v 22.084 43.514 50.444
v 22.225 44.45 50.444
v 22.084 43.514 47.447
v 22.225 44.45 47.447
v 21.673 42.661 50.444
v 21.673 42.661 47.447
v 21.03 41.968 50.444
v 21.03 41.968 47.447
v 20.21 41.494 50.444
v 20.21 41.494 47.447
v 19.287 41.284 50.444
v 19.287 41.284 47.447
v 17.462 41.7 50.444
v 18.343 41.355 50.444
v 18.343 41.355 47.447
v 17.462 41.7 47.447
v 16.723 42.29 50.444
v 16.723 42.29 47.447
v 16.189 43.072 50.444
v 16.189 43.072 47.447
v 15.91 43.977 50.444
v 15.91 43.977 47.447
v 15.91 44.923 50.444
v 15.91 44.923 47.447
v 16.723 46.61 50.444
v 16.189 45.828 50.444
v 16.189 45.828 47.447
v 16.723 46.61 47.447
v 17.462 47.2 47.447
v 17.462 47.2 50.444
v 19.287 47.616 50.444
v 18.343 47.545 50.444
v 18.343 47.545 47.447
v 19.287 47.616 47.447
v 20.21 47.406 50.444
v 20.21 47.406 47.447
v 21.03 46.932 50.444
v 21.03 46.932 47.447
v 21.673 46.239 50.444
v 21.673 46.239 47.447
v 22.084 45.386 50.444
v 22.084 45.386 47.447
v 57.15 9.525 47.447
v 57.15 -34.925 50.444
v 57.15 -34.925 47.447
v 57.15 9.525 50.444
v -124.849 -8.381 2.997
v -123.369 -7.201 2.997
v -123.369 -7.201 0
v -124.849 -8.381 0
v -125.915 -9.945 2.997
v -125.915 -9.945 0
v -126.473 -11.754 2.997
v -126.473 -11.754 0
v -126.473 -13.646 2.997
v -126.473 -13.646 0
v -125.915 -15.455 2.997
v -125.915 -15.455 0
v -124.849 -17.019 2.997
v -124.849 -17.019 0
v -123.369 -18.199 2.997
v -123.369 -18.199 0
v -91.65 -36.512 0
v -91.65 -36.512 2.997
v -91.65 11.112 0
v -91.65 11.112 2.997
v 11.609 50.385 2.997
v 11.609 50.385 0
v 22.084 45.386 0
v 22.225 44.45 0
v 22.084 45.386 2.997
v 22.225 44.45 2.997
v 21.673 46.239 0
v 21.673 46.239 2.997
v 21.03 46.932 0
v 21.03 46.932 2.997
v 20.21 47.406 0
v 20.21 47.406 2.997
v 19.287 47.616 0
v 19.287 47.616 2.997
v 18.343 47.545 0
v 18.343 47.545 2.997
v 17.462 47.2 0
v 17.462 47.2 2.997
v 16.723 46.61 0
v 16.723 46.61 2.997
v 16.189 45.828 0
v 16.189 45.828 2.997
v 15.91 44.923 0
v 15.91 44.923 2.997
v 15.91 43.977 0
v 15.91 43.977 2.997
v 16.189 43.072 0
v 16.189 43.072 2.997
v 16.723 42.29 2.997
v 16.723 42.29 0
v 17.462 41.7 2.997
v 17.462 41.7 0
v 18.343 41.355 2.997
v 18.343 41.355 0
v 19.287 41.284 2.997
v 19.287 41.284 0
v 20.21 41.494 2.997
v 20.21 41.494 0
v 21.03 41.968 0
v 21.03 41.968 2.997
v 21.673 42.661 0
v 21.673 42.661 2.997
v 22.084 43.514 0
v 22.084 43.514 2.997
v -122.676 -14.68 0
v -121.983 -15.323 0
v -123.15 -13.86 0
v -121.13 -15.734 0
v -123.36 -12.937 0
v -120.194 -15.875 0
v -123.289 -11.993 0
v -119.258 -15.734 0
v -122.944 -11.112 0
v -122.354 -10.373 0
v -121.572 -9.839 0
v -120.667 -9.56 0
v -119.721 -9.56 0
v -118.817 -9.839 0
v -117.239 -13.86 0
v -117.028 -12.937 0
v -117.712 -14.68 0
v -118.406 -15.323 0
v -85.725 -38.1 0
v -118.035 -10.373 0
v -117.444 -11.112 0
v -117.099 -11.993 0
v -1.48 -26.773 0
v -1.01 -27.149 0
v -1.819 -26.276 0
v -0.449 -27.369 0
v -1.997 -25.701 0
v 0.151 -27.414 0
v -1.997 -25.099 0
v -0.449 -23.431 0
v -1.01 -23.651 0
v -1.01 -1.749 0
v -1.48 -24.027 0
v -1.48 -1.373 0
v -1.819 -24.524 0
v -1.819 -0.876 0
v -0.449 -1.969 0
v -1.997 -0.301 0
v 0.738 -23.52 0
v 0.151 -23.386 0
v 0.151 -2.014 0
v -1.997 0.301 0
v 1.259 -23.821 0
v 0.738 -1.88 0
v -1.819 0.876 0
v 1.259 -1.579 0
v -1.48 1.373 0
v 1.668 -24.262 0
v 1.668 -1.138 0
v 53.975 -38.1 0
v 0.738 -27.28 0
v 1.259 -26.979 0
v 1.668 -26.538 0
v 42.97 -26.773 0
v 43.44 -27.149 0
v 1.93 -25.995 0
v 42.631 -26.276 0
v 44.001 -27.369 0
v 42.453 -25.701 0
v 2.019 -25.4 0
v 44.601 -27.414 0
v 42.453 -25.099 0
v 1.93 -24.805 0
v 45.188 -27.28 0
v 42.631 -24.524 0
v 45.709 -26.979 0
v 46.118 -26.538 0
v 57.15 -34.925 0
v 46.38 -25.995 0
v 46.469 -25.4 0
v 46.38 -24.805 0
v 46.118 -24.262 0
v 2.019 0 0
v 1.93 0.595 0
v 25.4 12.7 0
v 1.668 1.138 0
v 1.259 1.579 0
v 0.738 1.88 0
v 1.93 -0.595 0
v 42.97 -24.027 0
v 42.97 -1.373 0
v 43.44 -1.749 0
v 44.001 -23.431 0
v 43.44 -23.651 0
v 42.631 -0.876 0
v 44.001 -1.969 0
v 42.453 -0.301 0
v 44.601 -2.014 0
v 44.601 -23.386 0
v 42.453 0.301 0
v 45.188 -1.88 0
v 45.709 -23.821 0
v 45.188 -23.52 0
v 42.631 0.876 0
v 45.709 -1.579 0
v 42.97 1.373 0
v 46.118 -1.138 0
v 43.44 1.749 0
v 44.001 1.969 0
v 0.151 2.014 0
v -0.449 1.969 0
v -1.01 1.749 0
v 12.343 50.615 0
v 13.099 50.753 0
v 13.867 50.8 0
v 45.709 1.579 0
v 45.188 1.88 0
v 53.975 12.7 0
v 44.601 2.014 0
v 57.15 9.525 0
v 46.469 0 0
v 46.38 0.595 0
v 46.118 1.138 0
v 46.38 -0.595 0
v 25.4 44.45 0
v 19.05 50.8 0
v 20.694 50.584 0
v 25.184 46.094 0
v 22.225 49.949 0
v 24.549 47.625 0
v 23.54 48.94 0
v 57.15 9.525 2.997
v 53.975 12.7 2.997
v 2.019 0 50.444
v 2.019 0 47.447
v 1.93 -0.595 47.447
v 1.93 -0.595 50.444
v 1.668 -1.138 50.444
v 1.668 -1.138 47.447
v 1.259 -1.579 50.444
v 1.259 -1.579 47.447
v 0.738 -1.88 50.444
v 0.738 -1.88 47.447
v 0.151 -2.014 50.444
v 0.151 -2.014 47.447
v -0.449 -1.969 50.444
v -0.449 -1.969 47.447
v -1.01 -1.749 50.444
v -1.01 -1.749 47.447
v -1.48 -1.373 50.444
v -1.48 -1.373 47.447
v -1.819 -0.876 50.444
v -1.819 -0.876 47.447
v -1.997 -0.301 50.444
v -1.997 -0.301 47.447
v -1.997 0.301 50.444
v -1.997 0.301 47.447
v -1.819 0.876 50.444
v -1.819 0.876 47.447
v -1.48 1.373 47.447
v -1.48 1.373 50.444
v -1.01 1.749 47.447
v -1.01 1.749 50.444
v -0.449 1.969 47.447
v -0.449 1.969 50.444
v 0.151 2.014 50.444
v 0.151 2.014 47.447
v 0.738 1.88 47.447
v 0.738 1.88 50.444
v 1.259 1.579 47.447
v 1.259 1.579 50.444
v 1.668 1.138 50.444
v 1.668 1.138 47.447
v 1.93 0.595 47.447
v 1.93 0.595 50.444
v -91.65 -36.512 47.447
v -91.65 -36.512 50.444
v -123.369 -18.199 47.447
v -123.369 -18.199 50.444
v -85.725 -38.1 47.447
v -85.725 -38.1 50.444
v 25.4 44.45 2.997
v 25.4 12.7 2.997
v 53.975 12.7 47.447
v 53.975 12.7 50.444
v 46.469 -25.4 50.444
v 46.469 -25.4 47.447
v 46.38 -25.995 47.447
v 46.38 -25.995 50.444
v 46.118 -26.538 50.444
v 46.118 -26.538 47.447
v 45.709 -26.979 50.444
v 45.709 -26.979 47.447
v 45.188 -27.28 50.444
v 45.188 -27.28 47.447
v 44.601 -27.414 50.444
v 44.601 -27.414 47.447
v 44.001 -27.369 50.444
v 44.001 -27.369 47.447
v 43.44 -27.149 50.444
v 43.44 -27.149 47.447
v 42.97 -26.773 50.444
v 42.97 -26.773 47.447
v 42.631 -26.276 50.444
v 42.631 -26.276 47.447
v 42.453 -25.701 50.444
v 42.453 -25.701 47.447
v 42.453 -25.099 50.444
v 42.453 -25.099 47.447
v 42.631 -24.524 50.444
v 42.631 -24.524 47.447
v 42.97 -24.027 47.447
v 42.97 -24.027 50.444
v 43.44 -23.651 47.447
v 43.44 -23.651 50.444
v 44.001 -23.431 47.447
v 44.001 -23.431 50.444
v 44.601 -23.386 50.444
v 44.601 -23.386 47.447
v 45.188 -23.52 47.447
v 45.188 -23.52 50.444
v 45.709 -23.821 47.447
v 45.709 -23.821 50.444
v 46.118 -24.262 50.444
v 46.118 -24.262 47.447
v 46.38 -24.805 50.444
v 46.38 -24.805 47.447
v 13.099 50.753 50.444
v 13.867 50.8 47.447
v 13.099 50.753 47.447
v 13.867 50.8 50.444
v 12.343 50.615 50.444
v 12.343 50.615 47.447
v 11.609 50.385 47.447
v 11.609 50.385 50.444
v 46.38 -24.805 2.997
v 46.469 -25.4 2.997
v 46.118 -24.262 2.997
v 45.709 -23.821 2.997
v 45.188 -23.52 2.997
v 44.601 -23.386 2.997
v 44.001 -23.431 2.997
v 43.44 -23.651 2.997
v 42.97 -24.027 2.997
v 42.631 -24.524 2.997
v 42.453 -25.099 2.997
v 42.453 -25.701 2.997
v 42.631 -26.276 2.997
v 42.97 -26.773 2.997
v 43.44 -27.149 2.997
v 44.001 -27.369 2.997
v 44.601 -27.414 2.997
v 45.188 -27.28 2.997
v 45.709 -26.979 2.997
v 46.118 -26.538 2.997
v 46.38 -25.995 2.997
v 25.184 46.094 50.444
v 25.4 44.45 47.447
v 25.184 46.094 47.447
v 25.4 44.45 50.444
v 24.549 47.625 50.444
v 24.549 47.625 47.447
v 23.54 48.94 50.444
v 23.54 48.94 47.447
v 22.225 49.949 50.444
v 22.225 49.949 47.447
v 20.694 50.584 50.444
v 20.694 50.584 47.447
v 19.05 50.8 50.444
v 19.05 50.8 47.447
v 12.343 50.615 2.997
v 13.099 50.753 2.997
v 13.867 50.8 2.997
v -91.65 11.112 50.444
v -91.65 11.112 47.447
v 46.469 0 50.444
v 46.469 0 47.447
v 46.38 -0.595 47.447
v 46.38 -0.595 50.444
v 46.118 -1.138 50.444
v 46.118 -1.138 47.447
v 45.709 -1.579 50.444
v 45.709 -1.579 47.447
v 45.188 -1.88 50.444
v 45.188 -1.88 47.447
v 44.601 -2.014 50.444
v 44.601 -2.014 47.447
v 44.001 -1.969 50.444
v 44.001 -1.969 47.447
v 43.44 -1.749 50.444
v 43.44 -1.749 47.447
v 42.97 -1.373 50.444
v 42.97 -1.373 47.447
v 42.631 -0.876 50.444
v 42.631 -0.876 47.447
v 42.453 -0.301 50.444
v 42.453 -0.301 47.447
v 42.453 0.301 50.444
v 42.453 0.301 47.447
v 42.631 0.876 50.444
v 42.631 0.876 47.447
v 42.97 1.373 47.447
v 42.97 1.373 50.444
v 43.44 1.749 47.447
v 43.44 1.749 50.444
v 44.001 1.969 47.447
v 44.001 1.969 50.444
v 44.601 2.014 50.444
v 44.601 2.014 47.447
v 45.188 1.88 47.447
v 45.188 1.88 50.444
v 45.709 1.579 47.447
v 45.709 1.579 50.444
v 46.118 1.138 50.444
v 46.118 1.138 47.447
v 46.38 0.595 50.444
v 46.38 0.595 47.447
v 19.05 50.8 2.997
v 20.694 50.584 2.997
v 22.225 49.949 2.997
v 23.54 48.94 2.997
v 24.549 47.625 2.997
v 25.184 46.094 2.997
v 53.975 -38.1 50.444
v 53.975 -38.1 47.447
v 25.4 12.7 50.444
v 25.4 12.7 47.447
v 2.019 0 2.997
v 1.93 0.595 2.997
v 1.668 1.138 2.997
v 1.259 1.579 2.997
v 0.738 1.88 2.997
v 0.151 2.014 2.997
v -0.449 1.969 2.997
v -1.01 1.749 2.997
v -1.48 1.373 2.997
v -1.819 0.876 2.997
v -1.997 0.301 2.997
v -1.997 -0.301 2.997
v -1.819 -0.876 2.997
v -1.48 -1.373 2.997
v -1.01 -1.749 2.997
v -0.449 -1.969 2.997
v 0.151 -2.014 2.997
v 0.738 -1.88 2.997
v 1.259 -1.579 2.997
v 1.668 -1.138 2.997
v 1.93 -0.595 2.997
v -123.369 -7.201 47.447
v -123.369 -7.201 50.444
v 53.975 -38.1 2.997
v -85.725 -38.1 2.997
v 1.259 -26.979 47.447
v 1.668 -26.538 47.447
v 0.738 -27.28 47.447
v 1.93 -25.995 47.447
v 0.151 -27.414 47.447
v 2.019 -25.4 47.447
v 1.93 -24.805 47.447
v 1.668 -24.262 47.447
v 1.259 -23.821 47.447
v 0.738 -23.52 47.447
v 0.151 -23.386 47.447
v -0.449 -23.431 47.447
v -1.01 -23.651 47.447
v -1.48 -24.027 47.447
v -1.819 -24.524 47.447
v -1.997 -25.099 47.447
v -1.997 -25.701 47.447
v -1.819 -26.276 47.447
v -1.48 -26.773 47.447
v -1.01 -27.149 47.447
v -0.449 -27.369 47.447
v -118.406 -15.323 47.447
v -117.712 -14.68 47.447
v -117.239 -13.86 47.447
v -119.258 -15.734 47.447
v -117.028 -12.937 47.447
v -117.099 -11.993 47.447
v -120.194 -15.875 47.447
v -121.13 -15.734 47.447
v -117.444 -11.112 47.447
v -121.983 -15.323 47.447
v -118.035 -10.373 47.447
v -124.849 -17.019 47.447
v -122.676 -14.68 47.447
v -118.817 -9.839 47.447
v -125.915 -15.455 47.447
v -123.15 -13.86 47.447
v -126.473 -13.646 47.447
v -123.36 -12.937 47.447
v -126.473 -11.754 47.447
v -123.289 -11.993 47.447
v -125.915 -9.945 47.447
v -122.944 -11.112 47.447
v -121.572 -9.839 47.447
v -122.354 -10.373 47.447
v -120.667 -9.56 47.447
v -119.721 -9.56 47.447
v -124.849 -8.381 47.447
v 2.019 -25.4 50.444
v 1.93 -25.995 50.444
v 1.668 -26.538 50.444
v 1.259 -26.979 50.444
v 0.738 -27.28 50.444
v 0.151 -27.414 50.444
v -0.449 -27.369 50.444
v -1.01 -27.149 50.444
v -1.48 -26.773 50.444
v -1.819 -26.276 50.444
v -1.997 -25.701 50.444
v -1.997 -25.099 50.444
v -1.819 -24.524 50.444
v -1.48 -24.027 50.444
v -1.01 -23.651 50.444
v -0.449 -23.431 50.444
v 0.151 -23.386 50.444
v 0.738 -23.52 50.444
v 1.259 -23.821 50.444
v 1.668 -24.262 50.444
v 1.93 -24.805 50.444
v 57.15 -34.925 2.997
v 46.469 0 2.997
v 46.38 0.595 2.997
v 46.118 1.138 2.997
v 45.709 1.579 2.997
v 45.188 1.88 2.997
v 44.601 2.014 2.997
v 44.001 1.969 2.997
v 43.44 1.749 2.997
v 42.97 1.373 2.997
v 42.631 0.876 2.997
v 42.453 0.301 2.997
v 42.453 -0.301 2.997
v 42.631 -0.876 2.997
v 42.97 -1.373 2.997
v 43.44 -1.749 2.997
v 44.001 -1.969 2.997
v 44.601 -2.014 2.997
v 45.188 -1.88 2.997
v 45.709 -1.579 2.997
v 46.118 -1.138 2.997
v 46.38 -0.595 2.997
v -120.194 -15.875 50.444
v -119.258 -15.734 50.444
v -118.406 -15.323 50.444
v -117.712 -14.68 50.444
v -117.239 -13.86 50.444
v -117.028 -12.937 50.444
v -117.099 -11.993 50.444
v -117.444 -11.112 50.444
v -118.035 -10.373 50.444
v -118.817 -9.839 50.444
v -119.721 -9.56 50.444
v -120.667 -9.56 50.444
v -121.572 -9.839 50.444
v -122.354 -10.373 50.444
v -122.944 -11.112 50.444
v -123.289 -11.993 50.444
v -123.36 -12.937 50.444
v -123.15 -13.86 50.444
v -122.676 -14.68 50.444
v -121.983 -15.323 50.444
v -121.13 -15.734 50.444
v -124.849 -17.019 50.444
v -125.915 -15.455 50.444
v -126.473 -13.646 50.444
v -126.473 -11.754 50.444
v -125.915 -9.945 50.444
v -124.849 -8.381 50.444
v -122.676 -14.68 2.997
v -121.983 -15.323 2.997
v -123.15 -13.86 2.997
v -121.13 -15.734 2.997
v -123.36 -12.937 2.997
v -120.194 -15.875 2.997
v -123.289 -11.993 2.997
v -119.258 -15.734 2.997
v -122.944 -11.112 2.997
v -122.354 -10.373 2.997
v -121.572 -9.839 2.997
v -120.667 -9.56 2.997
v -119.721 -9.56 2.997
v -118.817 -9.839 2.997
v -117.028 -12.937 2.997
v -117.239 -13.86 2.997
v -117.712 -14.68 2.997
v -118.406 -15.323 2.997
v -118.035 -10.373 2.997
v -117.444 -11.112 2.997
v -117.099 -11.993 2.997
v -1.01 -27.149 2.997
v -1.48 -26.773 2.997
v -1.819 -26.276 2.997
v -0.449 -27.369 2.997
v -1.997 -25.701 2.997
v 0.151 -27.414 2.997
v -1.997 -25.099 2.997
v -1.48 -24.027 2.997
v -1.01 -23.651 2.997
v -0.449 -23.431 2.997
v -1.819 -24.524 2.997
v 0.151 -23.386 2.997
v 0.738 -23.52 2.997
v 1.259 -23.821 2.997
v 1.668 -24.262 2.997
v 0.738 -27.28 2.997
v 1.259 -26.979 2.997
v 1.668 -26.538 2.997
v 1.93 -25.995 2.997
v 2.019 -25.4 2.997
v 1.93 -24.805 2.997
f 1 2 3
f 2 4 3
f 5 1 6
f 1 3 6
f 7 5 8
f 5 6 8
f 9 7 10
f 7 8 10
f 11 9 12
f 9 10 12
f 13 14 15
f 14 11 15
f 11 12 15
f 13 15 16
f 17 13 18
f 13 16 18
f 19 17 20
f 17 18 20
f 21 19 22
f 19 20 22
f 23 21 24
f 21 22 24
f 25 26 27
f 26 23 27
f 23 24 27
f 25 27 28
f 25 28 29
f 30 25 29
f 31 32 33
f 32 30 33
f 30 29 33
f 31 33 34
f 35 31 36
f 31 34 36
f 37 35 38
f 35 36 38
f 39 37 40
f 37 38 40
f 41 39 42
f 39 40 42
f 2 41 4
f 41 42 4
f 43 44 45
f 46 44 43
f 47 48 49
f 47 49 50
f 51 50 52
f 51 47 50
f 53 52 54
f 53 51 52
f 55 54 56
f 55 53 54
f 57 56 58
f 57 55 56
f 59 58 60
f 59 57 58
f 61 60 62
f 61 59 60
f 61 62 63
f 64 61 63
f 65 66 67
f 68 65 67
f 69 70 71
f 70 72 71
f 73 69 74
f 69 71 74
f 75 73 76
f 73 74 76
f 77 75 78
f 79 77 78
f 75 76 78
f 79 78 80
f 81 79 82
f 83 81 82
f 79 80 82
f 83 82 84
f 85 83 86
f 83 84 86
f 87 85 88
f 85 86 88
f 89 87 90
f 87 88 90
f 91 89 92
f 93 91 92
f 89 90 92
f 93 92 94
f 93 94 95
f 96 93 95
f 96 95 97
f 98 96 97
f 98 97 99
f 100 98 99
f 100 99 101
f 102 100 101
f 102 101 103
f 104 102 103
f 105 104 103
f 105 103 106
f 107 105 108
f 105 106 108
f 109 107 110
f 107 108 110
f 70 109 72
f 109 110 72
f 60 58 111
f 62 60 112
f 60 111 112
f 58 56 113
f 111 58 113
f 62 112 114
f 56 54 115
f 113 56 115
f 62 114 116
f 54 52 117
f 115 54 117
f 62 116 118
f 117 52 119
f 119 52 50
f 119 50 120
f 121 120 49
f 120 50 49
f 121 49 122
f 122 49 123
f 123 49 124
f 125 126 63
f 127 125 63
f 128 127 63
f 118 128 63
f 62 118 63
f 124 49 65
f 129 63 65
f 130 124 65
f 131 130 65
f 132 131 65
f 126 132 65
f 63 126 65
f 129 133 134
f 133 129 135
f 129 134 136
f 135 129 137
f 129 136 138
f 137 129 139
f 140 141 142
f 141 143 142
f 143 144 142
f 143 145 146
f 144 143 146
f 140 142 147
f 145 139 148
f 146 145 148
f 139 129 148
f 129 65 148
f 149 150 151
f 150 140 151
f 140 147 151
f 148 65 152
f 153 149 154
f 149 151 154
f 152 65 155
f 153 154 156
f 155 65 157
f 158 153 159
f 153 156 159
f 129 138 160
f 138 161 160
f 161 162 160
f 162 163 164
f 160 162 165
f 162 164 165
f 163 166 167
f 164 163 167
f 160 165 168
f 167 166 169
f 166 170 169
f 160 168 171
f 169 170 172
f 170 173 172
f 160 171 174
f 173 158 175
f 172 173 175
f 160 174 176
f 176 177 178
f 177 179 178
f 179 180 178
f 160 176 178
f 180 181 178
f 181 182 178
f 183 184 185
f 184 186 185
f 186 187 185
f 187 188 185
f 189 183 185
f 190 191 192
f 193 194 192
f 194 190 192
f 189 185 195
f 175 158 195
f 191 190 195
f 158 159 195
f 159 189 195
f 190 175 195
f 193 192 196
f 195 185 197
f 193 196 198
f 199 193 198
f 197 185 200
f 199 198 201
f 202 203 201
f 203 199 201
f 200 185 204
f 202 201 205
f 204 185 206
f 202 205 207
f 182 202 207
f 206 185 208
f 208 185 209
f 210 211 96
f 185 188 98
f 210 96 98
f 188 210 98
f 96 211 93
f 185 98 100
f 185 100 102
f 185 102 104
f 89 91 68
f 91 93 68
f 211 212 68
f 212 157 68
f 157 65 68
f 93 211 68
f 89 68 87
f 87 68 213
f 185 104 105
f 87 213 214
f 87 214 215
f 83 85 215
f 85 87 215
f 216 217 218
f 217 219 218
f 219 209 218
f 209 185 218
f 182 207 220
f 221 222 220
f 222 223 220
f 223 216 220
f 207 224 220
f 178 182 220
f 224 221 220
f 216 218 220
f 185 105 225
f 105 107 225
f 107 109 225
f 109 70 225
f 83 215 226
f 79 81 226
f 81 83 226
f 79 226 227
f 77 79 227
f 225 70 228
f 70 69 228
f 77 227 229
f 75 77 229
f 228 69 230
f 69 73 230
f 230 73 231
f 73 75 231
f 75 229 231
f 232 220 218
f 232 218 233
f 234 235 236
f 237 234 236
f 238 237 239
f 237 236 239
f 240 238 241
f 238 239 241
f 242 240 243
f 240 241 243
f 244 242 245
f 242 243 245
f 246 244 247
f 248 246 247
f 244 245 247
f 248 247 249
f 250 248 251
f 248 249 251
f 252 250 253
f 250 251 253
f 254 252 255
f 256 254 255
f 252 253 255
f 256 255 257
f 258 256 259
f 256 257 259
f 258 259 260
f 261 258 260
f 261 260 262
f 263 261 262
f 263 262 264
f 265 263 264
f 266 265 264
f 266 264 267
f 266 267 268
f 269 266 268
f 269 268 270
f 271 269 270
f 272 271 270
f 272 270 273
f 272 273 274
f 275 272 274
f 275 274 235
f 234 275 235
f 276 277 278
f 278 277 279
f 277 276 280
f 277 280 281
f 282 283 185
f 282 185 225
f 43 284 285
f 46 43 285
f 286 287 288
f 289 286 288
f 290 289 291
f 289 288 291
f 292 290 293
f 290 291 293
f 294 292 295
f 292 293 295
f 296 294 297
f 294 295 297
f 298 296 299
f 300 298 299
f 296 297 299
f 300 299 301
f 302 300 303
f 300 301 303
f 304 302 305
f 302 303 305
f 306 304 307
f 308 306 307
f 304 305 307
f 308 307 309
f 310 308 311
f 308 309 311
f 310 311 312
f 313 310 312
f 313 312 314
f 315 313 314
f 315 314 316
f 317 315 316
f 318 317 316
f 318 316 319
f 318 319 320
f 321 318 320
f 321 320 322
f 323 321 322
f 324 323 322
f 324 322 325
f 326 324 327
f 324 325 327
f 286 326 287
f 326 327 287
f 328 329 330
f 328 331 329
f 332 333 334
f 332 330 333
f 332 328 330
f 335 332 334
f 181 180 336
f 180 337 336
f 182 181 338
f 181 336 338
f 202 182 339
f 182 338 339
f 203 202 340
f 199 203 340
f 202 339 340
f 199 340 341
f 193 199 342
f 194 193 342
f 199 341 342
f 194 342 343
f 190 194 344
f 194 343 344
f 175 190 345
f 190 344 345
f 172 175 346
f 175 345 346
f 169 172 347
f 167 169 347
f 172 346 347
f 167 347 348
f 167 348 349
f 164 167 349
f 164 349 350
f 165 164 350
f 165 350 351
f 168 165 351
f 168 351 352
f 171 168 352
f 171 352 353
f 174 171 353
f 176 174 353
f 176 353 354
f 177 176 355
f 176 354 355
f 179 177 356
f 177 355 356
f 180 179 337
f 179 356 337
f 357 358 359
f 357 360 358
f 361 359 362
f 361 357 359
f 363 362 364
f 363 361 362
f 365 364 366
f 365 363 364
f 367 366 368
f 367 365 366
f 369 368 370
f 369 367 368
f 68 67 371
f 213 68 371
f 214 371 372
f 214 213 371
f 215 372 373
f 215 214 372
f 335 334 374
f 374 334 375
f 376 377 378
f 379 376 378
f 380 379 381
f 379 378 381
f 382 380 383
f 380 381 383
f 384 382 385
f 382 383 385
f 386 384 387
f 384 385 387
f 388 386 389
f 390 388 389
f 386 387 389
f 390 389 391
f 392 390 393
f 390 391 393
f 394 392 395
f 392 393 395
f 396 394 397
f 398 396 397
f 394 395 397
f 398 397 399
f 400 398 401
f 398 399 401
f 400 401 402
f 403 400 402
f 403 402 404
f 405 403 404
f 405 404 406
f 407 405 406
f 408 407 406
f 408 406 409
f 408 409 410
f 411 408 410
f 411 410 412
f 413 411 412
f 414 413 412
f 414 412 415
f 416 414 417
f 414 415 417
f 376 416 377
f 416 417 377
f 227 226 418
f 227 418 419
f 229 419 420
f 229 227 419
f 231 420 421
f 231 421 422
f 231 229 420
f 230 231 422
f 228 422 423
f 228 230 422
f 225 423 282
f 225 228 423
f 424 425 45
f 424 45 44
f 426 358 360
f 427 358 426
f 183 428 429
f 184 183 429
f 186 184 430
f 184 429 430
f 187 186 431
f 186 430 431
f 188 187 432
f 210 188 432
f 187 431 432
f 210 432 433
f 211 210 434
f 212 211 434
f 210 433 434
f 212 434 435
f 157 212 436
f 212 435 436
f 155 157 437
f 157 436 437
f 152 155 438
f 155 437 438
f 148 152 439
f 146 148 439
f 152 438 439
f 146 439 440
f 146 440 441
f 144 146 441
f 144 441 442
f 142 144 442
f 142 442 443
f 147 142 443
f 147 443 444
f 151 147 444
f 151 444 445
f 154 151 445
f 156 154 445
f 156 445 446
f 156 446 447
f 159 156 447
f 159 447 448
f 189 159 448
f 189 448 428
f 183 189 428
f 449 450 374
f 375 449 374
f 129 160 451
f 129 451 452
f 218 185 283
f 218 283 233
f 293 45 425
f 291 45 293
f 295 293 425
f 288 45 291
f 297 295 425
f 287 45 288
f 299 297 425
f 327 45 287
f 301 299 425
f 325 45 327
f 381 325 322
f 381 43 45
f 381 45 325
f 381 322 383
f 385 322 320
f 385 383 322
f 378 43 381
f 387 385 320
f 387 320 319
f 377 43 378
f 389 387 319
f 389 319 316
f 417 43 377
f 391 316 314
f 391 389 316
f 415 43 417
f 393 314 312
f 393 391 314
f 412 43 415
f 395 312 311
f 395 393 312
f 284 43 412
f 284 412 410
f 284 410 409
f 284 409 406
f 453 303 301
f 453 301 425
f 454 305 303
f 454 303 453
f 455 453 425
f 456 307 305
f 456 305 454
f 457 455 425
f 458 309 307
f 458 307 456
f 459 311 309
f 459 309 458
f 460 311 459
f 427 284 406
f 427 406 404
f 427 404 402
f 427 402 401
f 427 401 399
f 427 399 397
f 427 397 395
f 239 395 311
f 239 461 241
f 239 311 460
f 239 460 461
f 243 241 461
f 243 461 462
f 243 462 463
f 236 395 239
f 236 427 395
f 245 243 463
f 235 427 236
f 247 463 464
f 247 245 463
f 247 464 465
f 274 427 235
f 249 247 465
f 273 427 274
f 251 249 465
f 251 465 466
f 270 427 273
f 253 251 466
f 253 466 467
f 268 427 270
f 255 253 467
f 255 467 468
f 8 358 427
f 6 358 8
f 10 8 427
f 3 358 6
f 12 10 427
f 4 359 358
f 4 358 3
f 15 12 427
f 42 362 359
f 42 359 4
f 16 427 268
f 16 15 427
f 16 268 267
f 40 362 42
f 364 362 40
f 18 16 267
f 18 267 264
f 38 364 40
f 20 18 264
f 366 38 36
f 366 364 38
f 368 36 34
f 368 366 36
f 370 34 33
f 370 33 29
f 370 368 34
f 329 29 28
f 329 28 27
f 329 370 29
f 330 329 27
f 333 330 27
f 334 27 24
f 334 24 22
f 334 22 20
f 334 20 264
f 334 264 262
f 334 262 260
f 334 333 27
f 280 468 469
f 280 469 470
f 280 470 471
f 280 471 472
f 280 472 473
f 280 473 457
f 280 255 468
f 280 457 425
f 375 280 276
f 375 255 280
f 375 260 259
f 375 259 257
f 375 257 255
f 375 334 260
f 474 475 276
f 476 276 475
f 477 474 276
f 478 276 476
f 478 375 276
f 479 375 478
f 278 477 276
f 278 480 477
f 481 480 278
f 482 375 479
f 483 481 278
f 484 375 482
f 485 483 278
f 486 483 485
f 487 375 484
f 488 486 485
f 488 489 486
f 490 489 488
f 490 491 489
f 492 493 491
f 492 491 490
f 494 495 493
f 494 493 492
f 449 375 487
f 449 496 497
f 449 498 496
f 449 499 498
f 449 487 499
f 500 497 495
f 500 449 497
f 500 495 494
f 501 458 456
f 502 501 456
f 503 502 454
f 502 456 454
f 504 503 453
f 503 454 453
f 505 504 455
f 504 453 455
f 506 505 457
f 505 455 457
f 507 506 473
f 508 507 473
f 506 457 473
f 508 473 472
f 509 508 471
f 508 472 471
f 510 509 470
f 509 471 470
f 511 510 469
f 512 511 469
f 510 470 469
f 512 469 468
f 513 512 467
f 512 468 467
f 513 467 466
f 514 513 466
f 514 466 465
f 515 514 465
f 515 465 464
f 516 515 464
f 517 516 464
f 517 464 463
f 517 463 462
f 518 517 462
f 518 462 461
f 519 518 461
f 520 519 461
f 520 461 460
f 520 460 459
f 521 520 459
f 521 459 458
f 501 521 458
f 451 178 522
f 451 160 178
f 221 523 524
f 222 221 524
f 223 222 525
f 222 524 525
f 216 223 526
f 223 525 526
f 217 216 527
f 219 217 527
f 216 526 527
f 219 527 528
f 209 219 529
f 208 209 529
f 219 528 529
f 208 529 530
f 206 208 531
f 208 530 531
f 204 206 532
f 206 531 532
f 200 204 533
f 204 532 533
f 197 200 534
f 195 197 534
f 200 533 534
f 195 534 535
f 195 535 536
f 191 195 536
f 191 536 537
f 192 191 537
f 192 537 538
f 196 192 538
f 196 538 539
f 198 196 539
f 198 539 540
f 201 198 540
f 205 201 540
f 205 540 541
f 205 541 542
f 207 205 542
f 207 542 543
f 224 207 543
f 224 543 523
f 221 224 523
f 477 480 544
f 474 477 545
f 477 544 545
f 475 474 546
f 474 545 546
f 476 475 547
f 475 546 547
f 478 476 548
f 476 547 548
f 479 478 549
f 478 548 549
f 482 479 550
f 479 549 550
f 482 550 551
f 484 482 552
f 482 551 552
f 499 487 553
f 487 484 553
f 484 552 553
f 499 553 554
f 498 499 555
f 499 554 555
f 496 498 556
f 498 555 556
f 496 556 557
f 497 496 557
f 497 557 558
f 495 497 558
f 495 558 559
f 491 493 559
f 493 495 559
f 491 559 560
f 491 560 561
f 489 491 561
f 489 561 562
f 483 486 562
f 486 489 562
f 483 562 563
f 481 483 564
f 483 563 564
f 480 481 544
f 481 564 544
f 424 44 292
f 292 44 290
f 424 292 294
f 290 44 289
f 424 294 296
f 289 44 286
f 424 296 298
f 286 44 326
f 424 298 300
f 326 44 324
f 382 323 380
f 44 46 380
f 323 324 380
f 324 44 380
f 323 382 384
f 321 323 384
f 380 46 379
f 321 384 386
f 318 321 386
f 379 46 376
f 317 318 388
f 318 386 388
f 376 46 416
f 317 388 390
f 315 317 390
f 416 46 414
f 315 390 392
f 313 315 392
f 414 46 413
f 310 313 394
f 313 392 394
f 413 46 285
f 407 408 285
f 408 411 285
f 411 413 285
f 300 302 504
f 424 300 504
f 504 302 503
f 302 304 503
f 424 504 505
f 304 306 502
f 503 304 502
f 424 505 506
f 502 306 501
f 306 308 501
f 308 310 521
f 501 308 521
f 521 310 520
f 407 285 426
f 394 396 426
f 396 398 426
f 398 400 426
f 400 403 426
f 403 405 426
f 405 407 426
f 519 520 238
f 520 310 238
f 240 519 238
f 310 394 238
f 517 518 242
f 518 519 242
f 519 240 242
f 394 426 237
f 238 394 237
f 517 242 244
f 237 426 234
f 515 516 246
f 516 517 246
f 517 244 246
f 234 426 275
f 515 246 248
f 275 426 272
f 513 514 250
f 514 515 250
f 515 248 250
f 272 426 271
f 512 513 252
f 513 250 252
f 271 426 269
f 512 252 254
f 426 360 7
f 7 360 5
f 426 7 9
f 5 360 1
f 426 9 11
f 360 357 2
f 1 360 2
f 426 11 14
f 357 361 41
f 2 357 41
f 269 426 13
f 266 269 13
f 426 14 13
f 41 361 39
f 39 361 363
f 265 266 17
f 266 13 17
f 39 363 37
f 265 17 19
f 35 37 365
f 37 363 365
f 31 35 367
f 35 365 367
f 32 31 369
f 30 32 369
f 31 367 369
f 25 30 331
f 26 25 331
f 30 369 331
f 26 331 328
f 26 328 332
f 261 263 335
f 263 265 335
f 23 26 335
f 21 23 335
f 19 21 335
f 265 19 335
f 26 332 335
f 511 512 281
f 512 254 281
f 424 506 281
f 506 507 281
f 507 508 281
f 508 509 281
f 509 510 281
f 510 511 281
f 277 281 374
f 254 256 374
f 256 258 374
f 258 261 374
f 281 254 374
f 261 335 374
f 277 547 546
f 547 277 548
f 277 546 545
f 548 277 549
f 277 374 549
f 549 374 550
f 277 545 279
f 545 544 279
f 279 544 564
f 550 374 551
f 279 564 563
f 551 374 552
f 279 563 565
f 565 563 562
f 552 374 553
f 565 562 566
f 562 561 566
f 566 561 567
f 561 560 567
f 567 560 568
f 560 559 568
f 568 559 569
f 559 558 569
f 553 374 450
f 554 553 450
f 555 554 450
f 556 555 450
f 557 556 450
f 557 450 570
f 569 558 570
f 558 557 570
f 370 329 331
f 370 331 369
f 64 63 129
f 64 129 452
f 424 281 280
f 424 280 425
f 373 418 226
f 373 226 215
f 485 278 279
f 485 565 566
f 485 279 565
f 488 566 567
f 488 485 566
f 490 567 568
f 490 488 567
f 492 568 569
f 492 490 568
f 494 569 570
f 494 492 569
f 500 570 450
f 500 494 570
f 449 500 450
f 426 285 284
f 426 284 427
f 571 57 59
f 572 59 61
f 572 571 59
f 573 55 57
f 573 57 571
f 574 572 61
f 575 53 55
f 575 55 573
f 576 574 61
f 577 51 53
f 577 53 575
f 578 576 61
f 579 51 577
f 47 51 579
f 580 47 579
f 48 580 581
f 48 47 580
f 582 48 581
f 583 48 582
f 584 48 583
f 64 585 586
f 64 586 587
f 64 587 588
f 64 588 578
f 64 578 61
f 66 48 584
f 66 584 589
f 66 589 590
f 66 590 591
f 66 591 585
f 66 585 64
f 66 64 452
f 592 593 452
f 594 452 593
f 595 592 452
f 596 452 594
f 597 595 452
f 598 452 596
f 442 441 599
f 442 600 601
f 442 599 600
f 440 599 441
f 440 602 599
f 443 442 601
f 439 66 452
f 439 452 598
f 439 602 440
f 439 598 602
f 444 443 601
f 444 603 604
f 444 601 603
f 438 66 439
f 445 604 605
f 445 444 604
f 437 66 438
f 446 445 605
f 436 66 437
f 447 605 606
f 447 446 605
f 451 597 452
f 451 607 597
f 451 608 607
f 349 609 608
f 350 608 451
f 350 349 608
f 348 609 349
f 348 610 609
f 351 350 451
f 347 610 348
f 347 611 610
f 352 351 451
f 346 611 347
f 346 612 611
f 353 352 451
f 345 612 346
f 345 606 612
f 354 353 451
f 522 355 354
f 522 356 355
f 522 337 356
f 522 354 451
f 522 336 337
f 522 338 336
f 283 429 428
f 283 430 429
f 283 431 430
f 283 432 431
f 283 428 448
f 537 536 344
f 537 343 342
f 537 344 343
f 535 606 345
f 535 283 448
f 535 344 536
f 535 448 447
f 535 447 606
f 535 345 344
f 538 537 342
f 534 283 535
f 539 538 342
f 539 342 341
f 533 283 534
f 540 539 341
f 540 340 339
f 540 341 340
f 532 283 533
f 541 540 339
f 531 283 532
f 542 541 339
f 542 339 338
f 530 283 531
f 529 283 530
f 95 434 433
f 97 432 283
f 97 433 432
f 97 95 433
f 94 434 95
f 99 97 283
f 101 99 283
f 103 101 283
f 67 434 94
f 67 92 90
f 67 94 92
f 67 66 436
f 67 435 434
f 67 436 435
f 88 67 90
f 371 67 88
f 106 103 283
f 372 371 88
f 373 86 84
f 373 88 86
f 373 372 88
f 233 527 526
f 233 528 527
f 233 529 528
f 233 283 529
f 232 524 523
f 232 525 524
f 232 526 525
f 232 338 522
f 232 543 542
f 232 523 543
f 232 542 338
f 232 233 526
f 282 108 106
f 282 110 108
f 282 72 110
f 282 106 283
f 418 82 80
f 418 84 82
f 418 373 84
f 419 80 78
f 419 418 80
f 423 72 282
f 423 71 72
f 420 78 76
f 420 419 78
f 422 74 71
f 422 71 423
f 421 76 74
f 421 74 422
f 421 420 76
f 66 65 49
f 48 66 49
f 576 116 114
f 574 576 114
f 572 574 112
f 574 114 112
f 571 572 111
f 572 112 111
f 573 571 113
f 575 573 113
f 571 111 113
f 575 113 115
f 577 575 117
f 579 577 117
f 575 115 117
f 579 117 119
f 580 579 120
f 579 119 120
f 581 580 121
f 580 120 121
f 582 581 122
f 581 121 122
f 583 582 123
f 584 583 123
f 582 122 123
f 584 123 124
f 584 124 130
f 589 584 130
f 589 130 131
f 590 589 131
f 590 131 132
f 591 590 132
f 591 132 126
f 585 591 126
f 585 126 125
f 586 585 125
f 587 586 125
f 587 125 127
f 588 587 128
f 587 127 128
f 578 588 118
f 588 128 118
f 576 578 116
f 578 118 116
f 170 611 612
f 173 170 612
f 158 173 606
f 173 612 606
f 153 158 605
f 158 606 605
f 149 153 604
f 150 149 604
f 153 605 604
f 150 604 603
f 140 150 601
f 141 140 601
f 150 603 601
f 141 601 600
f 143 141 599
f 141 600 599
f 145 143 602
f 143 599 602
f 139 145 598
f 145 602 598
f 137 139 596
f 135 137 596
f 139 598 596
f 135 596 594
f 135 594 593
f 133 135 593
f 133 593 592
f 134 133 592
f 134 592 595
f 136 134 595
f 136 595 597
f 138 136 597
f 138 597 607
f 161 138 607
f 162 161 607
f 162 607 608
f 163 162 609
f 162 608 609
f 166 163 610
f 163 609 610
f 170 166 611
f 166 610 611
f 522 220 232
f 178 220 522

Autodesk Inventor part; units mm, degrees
ref_plane "YZ Plane" through (0, 0, 0) normal (1, 0, 0) x (0, 1, 0)
ref_plane "XZ Plane" through (0, 0, 0) normal (0, 1, 0) x (-1, 0, 0)
sketch "Sketch1" plane through (0, 0, 0) normal (0, 0, 1) x (1, 0, 0)
  line L0 (0, 0) -> (44.45, 0) construction
  line L1 (44.45, 0) -> (44.45, -25.4) construction
  line L2 (44.45, -25.4) -> (0, -25.4) construction
  line L3 (0, -25.4) -> (0, 0) construction
  line L4 (-88.9, 12.7) -> (57.15, 12.7)
  line L5 (57.15, 12.7) -> (57.15, -38.1)
  line L6 (57.15, -38.1) -> (-88.9, -38.1)
  line L7 (-88.9, 12.7) -> (-132.8941, -12.7)
  line L8 (-132.8941, -12.7) -> (-88.9, -38.1)
  line L9 (-88.9, 12.7) -> (-88.9, -38.1) construction
  dimension "d0" = 44.45
  dimension "d1" = 25.4
  dimension "d2" = 12.7
  dimension "d3" = 12.7
  dimension "d5" = 12.7
  dimension "d37" = 146.05
  dimension "d38" = 50.8
extrude "Extrusion1" add sketch "Sketch1" along normal blind 2.9972
sketch "Sketch2" plane through (0, 0, 2.9972) normal (0, 0, 1) x (1, 0, 0)
  line L0 (0, -25.4) -> (44.45, -25.4) construction
  line L1 (44.45, -25.4) -> (44.45, 0) construction
  line L2 (44.45, 0) -> (0, 0) construction
  line L3 (0, 0) -> (0, -25.4) construction
  line L4 (-88.9, -38.1) -> (57.15, -38.1) projected
  line L5 (57.15, -38.1) -> (57.15, 12.7) projected
  circle A0 centre (0, 0) radius 2.0193
  circle A1 centre (44.45, 0) radius 2.0193
  circle A2 centre (44.45, -25.4) radius 2.0193
  circle A3 centre (0, -25.4) radius 2.0193
  point P0 (0, 0)
  dimension "d8" = 12.7
  dimension "d9" = 25.4
  dimension "d10" = 12.7
  dimension "d11" = 44.45
  dimension "d12" = 4.0386
extrude "Extrusion2" cut sketch "Sketch2" against normal through all
fillet "Fillet1" radius 6.35 1 edges at (-132.8941, -12.7, 1.4986)
chamfer "Chamfer1" distance 3.175 angle 45 4 edges at (57.15, 12.7, 1.4986) (57.15, -38.1, 1.4986) (-88.9, 12.7, 1.4986) (-88.9, -38.1, 1.4986)
sketch "Sketch3" plane through (0, 0, 2.9972) normal (0, 0, 1) x (1, 0, 0)
  arc A0 (-123.3691, -7.2007) -> (-123.3691, -18.1993) centre (-120.1941, -12.7) ccw projected
  circle A1 centre (-120.1941, -12.7) radius 3.175
  point P0 (0, 0)
  dimension "d19" = 6.35
hole "Hole1" at (-120.1941, -12.7, 2.9972) direction (0, 0, -1) diameter 6.35 end through all
sketch "Sketch4" plane through (0, 0, 2.9972) normal (0, 0, 1) x (1, 0, 0)
  circle A0 centre (19.05, 44.45) radius 3.175
  line L0 (53.975, 12.7) -> (-85.725, 12.7) projected
  line L1 (12.7, 12.7) -> (25.4, 12.7)
  line L2 (25.4, 12.7) -> (25.4, 50.8)
  line L3 (25.4, 50.8) -> (12.7, 50.8)
  line L4 (12.7, 50.8) -> (12.7, 12.7)
  line L5 (57.15, -34.925) -> (57.15, 9.525) projected
  line L6 (-91.6496, 11.1125) -> (-123.3691, -7.2007) projected
  line L7 (-91.6496, 11.1125) -> (12.7, 50.8)
  line L8 (-91.6496, 11.1125) -> (12.7, 12.7)
  point P0 (0, 0)
  dimension "d27" = 6.35
  dimension "d28" = 6.35
  dimension "d29" = 12.7
  dimension "d30" = 6.35
  dimension "d31" = 31.75
  dimension "d32" = 38.1
extrude "Extrusion3" add sketch "Sketch4" against normal blind 2.9972
fillet "Fillet2" radius 6.35 2 edges at (25.4, 50.8, 1.4986) (12.7, 50.8, 1.4986)
ref_plane "Work Plane1" through (0, 0, 25.2222) normal (0, 0, 1) x (1, 0, 0)
mirror "Mirror1" about plane through (0, 0, 25.2222) normal (0, 0, 1) of "Extrusion1", "Extrusion2", "Fillet1", "Chamfer1", "Hole1", "Extrusion3", "Fillet2"
properties part number "Papa John Mounting Plate" material "Polycarbonate, Clear"
